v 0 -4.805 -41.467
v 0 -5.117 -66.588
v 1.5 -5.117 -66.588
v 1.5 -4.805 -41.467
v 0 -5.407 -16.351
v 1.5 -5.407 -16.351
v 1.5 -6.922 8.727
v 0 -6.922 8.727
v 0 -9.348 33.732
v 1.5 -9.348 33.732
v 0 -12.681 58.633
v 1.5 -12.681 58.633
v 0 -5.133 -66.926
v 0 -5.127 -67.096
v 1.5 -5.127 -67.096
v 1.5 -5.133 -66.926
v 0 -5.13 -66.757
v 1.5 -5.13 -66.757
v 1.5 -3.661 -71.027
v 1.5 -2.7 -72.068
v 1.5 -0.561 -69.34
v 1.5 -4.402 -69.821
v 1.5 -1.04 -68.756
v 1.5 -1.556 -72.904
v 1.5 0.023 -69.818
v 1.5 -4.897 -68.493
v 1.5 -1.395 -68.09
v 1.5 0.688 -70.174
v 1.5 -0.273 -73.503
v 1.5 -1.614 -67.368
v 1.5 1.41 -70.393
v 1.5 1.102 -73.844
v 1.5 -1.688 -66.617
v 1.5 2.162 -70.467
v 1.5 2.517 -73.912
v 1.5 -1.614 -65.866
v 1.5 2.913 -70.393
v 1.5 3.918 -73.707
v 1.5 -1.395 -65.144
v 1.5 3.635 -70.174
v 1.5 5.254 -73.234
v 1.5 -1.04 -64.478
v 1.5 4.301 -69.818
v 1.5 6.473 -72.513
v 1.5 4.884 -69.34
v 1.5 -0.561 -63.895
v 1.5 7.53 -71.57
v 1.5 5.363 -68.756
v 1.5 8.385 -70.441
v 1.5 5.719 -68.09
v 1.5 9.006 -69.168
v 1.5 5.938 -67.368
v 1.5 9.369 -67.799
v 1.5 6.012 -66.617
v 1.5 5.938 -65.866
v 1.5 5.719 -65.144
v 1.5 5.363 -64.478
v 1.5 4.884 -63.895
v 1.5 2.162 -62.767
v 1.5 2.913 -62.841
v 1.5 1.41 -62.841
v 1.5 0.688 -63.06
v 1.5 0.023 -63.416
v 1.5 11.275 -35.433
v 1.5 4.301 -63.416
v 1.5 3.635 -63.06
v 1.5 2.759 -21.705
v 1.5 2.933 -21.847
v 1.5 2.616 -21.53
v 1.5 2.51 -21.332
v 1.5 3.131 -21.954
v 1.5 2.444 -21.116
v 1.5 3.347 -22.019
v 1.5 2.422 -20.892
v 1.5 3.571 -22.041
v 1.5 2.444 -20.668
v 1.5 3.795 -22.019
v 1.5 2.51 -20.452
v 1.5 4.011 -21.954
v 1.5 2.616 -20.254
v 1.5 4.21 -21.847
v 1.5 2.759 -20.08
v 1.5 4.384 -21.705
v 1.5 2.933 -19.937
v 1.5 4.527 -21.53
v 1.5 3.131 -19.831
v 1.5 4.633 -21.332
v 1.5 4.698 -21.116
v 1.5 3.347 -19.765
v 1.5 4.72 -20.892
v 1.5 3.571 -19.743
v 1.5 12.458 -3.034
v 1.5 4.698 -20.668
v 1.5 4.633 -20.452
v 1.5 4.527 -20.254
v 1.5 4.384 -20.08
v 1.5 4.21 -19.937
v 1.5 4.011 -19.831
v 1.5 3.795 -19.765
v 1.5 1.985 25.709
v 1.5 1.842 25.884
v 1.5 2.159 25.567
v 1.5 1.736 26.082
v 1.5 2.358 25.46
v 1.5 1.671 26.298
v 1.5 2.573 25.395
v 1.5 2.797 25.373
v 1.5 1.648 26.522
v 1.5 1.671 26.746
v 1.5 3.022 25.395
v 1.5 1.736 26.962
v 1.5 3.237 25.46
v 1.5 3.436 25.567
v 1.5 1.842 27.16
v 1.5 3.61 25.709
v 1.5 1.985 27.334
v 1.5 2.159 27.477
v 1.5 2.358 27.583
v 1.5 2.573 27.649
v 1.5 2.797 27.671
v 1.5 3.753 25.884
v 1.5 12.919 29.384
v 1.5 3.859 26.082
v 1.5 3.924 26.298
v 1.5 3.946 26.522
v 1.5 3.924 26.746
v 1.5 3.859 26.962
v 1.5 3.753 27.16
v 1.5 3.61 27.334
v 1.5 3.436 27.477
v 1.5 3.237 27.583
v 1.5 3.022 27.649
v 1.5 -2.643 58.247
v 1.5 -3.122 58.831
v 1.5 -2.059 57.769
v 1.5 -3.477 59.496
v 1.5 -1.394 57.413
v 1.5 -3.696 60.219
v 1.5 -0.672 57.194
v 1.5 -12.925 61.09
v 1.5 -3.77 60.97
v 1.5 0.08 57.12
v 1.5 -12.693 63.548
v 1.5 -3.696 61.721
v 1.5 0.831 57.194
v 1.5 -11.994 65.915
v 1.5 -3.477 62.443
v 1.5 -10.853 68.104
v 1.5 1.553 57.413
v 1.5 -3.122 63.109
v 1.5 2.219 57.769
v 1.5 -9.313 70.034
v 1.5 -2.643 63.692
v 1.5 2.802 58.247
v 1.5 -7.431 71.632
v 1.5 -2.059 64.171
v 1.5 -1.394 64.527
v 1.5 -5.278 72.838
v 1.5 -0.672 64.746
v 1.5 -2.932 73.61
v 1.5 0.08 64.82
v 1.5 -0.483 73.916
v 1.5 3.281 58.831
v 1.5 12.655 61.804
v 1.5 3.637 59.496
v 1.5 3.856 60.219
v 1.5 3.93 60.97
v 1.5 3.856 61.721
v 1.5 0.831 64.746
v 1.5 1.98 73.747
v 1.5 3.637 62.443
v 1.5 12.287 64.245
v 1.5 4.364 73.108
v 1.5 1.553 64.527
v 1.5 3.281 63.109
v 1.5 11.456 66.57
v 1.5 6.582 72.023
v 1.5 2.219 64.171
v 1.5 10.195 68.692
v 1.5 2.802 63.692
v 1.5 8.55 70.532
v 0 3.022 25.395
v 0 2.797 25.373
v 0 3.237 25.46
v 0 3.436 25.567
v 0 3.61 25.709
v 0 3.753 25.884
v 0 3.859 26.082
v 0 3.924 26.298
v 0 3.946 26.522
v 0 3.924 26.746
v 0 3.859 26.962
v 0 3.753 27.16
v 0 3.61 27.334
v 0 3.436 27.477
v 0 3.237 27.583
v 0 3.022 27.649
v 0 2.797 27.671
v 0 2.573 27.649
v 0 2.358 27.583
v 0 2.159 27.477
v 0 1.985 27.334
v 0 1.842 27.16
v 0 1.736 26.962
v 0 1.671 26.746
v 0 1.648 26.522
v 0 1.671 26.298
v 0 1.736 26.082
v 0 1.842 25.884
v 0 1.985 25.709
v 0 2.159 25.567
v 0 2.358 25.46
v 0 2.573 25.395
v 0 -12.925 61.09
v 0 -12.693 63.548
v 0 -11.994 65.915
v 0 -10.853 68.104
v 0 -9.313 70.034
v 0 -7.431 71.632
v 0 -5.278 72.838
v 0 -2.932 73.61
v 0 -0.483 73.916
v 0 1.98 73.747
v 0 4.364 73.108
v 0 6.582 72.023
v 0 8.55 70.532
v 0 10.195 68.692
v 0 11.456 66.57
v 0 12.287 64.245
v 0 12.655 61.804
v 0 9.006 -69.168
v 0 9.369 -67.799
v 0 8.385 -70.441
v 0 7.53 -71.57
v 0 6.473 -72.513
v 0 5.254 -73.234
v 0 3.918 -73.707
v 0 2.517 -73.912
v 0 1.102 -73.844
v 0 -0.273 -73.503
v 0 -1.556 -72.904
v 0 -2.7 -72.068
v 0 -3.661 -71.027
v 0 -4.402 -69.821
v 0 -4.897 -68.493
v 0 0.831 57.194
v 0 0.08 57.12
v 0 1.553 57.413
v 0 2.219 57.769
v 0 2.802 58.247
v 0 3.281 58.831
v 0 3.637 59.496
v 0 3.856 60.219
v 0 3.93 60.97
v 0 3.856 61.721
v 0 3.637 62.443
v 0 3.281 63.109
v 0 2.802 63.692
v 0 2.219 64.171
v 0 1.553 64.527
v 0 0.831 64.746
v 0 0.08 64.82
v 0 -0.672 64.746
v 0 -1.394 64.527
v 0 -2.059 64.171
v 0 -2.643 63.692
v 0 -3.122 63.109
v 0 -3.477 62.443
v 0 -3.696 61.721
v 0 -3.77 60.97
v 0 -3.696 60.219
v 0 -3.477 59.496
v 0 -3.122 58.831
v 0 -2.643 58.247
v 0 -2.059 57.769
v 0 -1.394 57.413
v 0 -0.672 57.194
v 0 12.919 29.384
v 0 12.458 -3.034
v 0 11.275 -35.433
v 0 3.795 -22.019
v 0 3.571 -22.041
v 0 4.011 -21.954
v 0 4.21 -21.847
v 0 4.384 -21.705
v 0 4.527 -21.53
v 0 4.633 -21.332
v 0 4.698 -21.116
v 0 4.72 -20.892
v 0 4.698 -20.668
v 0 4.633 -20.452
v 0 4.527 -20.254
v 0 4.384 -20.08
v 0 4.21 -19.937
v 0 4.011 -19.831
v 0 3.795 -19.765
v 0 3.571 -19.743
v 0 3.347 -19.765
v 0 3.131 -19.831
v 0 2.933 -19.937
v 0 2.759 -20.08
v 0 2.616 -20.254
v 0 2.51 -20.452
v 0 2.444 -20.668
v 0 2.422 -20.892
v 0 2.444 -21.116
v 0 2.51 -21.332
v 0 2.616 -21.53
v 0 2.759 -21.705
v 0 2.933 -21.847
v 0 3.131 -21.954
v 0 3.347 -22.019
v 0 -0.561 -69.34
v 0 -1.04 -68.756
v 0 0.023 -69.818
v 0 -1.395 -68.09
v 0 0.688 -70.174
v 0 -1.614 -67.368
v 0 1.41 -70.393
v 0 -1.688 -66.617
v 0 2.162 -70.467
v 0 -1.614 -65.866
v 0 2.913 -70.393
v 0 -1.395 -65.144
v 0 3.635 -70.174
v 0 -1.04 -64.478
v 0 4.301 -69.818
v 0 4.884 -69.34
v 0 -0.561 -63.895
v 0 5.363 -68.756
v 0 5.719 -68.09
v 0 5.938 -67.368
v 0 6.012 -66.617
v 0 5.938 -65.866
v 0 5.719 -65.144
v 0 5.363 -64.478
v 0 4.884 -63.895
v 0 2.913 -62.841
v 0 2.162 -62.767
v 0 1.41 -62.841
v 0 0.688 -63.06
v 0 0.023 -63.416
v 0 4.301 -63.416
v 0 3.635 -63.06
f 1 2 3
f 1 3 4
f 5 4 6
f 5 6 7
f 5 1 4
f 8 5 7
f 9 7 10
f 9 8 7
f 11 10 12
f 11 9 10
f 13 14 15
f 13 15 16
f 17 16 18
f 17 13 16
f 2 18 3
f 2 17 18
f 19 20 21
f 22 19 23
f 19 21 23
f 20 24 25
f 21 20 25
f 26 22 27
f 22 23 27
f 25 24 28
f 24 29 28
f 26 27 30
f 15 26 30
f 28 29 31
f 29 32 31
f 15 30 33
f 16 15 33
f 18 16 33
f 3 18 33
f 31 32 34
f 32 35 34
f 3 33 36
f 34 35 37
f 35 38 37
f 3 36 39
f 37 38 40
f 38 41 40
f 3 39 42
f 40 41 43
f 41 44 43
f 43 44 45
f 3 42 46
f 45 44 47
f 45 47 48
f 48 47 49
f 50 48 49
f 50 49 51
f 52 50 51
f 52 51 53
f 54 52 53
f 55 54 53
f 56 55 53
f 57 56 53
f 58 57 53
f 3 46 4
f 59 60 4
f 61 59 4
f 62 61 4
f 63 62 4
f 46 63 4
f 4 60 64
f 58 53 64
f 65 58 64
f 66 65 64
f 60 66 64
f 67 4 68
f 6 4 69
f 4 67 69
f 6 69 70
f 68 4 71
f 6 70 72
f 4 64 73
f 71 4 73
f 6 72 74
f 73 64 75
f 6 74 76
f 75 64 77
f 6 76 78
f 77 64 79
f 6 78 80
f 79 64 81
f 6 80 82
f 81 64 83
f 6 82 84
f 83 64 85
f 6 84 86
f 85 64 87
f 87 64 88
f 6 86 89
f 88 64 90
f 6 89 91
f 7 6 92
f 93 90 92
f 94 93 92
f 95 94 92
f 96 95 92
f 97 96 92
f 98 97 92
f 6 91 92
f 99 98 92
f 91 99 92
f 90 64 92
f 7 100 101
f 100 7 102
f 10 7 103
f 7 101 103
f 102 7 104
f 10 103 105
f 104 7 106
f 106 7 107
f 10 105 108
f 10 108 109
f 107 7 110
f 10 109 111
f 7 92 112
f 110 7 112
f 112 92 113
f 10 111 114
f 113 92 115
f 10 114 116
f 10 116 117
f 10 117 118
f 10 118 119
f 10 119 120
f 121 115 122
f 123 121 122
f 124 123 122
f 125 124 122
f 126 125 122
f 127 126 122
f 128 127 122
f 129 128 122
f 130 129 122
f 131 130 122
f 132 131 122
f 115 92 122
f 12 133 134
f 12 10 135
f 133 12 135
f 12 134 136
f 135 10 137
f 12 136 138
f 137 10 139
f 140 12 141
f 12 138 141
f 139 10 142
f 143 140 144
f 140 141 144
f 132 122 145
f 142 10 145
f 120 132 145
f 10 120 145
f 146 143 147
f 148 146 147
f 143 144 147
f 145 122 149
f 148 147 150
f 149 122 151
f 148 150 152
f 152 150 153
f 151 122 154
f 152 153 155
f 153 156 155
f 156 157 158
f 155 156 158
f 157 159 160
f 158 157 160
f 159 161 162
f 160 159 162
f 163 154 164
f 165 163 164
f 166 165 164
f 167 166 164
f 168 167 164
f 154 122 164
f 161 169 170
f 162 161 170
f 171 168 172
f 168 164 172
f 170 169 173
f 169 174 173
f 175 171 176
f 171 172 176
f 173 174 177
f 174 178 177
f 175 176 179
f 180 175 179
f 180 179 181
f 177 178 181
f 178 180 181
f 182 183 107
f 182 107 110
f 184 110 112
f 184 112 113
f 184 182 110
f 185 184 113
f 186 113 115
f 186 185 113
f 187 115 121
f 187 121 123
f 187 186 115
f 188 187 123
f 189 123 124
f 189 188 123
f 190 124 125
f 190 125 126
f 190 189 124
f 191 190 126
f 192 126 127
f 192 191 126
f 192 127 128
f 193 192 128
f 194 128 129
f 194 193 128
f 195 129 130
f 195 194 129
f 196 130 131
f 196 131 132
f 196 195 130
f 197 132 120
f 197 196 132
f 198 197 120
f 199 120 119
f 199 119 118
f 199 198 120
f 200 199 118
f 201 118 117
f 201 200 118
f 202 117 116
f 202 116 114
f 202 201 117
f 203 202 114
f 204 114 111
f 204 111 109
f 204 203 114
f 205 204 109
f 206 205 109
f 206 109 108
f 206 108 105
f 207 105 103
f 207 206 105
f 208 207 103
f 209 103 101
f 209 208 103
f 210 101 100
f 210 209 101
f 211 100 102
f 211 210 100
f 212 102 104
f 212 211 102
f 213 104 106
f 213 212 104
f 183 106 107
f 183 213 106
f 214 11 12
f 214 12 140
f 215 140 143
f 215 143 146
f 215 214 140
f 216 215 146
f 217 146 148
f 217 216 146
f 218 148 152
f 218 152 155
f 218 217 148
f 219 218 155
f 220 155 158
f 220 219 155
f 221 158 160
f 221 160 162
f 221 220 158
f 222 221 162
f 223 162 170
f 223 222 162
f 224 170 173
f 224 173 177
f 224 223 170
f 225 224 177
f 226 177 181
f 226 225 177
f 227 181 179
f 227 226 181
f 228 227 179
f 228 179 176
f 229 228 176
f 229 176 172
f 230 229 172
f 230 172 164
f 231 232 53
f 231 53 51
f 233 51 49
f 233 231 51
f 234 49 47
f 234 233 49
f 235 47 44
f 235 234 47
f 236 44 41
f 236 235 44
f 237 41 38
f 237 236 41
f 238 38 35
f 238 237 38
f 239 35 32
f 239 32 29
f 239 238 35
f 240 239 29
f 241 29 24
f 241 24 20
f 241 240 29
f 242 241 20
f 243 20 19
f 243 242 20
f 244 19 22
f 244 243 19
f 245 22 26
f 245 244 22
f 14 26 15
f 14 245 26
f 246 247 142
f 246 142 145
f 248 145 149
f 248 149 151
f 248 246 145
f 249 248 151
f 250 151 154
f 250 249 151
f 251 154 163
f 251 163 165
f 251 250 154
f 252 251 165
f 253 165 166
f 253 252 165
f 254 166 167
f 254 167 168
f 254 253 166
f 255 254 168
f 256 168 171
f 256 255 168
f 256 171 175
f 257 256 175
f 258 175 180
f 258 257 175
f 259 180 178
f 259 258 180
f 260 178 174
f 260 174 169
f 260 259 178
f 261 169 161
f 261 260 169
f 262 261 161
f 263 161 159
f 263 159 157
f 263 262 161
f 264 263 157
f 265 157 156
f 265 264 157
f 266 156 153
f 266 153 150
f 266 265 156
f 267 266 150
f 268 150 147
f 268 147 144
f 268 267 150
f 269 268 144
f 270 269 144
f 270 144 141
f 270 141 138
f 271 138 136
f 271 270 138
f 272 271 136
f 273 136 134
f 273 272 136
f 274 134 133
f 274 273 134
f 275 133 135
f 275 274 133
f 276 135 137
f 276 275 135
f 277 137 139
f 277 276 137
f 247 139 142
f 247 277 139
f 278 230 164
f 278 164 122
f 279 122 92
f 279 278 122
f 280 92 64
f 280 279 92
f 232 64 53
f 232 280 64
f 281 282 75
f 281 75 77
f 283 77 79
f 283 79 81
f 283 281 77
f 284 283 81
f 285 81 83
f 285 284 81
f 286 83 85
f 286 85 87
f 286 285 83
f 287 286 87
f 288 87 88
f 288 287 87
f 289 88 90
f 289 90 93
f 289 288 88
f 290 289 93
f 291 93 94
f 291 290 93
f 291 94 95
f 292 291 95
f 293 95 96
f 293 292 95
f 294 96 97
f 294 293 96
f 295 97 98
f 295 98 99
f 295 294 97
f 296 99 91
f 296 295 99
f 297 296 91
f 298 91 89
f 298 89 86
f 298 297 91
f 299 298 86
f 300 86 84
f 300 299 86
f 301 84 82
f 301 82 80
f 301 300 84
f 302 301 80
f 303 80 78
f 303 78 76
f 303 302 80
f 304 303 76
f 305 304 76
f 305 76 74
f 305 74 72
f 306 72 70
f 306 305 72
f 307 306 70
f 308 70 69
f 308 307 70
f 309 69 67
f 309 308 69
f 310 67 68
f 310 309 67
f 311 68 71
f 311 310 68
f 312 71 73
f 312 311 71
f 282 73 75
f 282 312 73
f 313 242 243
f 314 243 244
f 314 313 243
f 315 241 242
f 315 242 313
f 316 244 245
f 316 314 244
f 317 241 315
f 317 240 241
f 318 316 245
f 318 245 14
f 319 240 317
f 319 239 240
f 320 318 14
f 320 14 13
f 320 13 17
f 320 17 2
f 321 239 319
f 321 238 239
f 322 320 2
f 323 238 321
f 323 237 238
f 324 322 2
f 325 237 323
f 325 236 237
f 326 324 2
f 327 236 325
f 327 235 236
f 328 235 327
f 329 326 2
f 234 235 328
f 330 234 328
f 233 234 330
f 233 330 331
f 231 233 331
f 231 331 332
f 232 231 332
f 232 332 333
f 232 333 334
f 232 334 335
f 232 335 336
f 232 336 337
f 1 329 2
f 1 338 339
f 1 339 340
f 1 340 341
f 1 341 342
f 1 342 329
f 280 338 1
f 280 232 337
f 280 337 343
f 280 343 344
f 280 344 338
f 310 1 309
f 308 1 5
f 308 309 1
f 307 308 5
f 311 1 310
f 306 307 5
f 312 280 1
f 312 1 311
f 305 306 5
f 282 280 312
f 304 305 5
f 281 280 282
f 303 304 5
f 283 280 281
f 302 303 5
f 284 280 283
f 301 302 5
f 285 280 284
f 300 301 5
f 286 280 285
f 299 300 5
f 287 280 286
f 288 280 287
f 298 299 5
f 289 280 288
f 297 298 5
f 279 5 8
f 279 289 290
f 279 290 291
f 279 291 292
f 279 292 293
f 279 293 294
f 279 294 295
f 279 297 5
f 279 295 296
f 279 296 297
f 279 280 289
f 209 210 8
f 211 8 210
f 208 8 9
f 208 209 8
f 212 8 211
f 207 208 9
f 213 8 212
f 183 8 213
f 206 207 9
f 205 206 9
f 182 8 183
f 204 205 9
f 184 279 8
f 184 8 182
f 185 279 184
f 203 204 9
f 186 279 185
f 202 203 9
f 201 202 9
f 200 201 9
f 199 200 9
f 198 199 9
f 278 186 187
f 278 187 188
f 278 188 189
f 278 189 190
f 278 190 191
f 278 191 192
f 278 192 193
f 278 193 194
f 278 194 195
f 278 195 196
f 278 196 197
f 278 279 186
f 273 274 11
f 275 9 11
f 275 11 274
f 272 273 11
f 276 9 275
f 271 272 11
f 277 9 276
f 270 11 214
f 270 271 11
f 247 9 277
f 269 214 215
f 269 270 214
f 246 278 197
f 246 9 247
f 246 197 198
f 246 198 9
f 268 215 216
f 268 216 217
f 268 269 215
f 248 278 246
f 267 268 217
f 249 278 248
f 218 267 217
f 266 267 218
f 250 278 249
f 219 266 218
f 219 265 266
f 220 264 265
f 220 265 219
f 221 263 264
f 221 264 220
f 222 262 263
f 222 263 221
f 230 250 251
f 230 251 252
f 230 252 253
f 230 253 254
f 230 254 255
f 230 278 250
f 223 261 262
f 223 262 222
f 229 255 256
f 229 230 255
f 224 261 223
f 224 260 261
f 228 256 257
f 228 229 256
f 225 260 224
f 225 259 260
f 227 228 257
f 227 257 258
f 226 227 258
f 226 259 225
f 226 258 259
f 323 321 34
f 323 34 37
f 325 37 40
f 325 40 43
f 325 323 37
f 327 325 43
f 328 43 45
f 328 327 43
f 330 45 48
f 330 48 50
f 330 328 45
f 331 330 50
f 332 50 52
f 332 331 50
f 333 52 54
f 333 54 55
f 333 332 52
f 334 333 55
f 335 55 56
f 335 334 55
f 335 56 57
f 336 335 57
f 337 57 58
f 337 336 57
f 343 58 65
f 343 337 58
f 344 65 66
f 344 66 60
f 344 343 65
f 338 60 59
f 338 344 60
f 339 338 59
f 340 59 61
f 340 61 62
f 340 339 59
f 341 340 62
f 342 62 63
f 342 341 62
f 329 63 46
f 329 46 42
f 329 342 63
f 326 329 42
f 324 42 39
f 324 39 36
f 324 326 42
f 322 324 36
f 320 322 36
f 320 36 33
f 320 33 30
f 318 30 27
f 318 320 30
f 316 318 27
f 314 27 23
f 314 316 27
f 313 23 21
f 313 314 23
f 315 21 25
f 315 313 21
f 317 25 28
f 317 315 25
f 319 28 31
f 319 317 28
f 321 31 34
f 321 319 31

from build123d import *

# Parameters (mm, degrees)
SKETCH_1_R      = 3.85
SKETCH_1_R_2    = 1.149031008
EXTRUDE_1_DEPTH = 1.5


with BuildPart() as part:
    # 草圖1 → 填料-伸長1 (new body)
    with BuildSketch(Plane(origin=(0, 0, 0), x_dir=(0, 0, -1), z_dir=(1, 0, 0))):
        with BuildLine():
            ThreePointArc((66.587683924, -5.116627236), (3.80507147, -6.050846657), (-58.633451622, -12.681082444))
            ThreePointArc((-58.633451622, -12.681082444), (-73.821962275, -1.715080477), (-61.804017134, 12.655481431))
            ThreePointArc((-61.804017134, 12.655481431), (3.033906142, 12.458288366), (67.798504291, 9.369274541))
            ThreePointArc((67.798504291, 9.369274541), (73.912446594, 1.807845069), (67.095645487, -5.12661445))
            ThreePointArc((67.095645487, -5.12661445), (66.8414518, -5.132449469), (66.587683924, -5.116627236))
        make_face()
        with Locations((66.61714054, 2.16157088)):
            Circle(SKETCH_1_R, mode=Mode.SUBTRACT)
        with Locations((-60.969663313, 0.079585479)):
            Circle(SKETCH_1_R, mode=Mode.SUBTRACT)
        with Locations((20.89210292, 3.571177524)):
            Circle(SKETCH_1_R_2, mode=Mode.SUBTRACT)
        with Locations((-26.521912025, 2.797466734)):
            Circle(SKETCH_1_R_2, mode=Mode.SUBTRACT)
    extrude(amount=EXTRUDE_1_DEPTH)


solid = part.part
